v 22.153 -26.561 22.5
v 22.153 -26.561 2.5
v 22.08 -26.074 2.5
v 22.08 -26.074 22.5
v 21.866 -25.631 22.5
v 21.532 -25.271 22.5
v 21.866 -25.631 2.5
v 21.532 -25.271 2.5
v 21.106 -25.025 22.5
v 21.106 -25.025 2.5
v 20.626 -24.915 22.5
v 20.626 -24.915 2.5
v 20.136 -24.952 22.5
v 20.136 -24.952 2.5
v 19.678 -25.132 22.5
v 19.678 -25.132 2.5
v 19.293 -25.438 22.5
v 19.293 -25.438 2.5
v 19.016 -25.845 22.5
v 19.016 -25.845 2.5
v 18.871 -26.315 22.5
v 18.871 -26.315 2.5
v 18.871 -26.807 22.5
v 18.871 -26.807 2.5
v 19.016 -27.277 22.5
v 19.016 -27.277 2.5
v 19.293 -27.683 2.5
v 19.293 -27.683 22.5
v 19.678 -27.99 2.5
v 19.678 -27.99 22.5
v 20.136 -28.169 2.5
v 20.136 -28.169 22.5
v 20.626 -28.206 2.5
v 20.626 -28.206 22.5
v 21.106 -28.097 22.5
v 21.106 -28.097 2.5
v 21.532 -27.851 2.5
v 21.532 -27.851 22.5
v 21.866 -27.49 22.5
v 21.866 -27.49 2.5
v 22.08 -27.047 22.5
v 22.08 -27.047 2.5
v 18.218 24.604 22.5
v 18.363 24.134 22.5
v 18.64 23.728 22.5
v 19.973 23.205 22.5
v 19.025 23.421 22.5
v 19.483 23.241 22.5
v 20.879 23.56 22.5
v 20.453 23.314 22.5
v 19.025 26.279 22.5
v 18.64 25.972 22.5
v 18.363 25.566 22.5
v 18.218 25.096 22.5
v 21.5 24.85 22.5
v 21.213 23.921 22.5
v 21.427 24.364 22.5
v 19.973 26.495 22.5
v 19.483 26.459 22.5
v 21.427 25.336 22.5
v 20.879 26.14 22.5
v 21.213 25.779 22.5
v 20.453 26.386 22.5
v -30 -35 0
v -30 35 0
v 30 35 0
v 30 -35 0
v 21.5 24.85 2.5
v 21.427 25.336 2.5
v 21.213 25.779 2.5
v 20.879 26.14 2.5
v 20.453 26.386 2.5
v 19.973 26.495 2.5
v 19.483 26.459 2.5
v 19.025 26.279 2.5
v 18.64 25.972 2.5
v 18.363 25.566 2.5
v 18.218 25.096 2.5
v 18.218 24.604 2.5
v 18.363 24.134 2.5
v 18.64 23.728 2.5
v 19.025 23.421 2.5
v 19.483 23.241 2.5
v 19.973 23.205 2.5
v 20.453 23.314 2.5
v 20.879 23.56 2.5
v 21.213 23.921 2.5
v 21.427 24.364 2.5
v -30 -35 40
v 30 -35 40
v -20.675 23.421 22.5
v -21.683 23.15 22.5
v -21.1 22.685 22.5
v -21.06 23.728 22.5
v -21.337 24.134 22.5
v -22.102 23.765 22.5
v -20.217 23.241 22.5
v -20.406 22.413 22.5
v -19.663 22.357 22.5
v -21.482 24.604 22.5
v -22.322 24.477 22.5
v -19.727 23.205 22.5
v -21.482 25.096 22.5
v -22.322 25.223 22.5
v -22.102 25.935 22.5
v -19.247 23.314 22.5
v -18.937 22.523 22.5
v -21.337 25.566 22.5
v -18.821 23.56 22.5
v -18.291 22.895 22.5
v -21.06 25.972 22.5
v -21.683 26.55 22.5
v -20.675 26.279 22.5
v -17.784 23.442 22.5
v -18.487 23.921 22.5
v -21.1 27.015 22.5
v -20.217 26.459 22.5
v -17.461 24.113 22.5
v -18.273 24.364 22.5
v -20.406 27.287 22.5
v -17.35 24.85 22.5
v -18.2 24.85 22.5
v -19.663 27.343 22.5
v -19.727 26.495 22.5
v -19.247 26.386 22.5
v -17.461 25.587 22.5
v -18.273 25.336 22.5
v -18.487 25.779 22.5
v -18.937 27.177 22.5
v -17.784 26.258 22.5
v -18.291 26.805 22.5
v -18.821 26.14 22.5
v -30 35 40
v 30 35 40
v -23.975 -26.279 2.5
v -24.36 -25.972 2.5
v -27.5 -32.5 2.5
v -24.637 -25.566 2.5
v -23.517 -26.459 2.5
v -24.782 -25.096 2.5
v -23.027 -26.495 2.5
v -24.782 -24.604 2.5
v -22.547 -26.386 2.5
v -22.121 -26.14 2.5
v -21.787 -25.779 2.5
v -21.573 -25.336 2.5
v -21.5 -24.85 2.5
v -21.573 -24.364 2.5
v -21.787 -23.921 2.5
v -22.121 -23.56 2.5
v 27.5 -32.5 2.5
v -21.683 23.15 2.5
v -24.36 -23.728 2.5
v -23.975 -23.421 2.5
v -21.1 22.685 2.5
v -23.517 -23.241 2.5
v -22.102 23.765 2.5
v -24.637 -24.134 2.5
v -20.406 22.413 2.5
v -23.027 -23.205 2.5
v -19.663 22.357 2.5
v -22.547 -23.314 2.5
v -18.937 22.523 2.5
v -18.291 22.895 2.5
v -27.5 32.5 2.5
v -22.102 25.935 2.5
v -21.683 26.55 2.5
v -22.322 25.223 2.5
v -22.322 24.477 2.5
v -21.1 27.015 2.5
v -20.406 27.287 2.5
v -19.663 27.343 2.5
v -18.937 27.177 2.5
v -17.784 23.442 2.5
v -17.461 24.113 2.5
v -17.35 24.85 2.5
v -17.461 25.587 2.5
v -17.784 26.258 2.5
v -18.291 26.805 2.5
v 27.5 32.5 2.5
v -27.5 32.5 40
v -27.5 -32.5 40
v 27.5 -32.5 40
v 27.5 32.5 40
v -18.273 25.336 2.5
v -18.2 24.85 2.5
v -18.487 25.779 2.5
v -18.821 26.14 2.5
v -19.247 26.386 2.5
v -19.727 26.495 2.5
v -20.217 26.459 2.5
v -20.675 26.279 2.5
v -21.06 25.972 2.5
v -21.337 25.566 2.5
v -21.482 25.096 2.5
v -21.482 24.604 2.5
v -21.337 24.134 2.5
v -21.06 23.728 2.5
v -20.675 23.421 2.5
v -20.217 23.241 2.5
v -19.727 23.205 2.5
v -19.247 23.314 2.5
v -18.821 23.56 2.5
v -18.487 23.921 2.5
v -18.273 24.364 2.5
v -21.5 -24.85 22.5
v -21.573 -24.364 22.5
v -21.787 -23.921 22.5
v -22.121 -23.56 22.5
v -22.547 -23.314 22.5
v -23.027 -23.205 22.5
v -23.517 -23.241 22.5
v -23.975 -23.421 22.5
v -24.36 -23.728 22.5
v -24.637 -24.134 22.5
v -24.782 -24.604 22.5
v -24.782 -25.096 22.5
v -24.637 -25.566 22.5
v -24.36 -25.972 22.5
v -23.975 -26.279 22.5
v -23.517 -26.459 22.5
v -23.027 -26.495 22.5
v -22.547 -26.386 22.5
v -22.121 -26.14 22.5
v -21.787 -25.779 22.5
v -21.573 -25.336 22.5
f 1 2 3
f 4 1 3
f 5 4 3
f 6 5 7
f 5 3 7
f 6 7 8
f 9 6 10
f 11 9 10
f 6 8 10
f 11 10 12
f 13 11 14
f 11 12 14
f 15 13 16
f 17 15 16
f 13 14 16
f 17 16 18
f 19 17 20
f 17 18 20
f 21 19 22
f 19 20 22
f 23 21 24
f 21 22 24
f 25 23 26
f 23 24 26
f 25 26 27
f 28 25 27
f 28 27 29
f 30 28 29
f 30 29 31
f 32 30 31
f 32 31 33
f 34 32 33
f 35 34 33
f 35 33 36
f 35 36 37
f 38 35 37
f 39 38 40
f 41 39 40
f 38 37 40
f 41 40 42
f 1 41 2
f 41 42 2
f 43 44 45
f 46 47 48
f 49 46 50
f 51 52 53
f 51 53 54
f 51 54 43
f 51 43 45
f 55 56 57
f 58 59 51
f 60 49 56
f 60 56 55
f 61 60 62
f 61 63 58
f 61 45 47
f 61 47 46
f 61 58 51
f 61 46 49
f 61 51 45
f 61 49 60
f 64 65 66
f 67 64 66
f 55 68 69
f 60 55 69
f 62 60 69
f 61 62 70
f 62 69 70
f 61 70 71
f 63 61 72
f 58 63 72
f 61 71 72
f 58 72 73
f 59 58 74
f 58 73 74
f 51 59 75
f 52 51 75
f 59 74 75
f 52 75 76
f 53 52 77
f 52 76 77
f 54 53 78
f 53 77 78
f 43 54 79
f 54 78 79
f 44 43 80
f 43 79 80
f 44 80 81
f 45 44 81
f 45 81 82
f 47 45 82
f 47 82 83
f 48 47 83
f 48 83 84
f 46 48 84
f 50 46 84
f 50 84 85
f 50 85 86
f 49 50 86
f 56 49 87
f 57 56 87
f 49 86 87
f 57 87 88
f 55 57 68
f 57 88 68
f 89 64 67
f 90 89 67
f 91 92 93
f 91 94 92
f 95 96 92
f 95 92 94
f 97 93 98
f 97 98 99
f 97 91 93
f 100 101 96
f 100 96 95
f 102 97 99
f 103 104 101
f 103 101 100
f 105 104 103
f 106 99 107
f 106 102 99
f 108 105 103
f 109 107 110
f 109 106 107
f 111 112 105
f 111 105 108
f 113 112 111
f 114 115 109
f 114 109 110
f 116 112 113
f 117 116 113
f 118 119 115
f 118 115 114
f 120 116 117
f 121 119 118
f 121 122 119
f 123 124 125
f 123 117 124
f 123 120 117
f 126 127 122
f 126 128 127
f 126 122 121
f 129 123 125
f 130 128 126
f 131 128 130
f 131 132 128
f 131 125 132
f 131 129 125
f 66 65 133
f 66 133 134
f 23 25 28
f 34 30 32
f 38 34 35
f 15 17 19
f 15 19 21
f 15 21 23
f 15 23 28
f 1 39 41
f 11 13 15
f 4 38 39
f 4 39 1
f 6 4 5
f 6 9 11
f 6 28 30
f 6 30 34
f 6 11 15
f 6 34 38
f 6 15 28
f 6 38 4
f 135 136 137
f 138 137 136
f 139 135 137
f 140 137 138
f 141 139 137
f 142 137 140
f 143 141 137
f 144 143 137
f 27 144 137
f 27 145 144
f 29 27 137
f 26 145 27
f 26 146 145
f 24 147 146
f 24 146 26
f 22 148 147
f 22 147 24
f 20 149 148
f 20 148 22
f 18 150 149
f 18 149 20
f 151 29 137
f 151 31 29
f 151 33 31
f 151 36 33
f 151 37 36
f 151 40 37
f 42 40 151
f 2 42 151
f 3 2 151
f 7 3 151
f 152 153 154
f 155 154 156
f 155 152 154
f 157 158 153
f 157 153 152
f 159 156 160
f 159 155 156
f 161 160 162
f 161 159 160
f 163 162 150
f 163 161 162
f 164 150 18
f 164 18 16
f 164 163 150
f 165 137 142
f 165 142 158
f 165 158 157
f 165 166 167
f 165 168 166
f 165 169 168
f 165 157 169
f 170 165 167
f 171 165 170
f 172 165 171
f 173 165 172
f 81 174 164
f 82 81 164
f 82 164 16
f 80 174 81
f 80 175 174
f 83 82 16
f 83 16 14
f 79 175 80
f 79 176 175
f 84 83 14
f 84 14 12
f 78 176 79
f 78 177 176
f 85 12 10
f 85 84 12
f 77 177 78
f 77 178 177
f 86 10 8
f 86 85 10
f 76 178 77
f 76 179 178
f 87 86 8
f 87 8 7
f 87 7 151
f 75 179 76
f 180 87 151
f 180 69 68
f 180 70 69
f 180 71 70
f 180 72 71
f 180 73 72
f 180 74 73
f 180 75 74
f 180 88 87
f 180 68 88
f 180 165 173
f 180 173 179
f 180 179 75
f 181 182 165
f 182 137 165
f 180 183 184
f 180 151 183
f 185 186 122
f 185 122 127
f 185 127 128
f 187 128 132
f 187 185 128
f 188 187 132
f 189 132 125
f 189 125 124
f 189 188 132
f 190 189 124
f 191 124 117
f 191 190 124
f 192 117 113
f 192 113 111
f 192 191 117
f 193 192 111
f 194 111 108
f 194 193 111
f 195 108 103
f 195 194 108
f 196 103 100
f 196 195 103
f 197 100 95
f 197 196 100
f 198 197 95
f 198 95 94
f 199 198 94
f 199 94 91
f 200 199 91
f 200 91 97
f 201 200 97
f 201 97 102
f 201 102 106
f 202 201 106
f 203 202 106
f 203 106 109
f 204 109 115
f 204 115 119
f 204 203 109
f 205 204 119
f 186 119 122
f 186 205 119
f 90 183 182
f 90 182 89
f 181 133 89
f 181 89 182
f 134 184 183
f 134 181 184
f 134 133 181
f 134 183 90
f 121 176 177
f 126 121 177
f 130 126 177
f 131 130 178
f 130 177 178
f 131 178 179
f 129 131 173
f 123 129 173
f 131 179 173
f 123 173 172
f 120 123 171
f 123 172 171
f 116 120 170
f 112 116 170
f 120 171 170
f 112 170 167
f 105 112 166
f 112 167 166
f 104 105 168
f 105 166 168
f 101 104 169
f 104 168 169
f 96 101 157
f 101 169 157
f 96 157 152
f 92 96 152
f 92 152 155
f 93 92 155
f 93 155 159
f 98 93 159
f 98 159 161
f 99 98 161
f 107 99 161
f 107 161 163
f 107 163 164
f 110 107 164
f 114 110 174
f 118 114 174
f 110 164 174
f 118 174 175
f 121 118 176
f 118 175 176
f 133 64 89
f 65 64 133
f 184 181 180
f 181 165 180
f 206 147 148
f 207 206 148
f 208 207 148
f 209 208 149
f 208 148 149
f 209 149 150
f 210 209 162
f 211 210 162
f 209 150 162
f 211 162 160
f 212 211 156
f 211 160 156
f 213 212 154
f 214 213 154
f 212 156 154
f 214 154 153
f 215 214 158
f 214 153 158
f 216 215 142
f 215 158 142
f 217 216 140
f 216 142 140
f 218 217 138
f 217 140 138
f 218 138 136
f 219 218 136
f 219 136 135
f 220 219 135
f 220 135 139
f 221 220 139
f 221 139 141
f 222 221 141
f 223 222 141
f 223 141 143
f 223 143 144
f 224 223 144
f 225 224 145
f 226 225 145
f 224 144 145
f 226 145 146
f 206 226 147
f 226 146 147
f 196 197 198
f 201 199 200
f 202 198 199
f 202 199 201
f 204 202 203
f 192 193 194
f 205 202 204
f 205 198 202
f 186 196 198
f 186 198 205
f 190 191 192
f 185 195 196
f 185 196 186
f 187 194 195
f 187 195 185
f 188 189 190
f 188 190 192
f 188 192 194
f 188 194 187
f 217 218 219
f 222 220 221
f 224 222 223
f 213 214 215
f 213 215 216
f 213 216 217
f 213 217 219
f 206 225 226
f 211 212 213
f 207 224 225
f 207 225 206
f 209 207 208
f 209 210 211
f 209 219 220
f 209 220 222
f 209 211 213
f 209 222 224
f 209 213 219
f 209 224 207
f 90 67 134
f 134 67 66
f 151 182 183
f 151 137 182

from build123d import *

# Parameters (mm, degrees)
F1_W     = 60
F1_H     = 70
F2_DEPTH = 40
F3_T     = -2.5
F4_R     = 1.65
F4_R_2   = 2.5
F5_DEPTH = 20


with BuildPart() as f2:
    # F1 (on Top) → F2 (new body)
    with BuildSketch(Plane.XY):
        Rectangle(F1_W, F1_H)
    extrude(amount=F2_DEPTH)

    # F3
    f3_openings = [f2.faces().sort_by_distance(p)[0] for p in [
        (0, 0, 40),
    ]]
    offset(amount=F3_T, openings=f3_openings)

    # F4 (on face) → F5 (join)
    with BuildSketch(Plane.XY.offset(2.5)):
        with Locations((-23.15, -24.85)):
            Circle(F4_R)
        with Locations((19.85, 24.85)):
            Circle(F4_R)
        with Locations((20.5029603094, -26.5606511384)):
            Circle(F4_R)
        with Locations((-19.85, 24.85)):
            Circle(F4_R_2)
        with Locations((-19.85, 24.85)):
            Circle(F4_R, mode=Mode.SUBTRACT)
    extrude(amount=F5_DEPTH)


solid = f2.part
